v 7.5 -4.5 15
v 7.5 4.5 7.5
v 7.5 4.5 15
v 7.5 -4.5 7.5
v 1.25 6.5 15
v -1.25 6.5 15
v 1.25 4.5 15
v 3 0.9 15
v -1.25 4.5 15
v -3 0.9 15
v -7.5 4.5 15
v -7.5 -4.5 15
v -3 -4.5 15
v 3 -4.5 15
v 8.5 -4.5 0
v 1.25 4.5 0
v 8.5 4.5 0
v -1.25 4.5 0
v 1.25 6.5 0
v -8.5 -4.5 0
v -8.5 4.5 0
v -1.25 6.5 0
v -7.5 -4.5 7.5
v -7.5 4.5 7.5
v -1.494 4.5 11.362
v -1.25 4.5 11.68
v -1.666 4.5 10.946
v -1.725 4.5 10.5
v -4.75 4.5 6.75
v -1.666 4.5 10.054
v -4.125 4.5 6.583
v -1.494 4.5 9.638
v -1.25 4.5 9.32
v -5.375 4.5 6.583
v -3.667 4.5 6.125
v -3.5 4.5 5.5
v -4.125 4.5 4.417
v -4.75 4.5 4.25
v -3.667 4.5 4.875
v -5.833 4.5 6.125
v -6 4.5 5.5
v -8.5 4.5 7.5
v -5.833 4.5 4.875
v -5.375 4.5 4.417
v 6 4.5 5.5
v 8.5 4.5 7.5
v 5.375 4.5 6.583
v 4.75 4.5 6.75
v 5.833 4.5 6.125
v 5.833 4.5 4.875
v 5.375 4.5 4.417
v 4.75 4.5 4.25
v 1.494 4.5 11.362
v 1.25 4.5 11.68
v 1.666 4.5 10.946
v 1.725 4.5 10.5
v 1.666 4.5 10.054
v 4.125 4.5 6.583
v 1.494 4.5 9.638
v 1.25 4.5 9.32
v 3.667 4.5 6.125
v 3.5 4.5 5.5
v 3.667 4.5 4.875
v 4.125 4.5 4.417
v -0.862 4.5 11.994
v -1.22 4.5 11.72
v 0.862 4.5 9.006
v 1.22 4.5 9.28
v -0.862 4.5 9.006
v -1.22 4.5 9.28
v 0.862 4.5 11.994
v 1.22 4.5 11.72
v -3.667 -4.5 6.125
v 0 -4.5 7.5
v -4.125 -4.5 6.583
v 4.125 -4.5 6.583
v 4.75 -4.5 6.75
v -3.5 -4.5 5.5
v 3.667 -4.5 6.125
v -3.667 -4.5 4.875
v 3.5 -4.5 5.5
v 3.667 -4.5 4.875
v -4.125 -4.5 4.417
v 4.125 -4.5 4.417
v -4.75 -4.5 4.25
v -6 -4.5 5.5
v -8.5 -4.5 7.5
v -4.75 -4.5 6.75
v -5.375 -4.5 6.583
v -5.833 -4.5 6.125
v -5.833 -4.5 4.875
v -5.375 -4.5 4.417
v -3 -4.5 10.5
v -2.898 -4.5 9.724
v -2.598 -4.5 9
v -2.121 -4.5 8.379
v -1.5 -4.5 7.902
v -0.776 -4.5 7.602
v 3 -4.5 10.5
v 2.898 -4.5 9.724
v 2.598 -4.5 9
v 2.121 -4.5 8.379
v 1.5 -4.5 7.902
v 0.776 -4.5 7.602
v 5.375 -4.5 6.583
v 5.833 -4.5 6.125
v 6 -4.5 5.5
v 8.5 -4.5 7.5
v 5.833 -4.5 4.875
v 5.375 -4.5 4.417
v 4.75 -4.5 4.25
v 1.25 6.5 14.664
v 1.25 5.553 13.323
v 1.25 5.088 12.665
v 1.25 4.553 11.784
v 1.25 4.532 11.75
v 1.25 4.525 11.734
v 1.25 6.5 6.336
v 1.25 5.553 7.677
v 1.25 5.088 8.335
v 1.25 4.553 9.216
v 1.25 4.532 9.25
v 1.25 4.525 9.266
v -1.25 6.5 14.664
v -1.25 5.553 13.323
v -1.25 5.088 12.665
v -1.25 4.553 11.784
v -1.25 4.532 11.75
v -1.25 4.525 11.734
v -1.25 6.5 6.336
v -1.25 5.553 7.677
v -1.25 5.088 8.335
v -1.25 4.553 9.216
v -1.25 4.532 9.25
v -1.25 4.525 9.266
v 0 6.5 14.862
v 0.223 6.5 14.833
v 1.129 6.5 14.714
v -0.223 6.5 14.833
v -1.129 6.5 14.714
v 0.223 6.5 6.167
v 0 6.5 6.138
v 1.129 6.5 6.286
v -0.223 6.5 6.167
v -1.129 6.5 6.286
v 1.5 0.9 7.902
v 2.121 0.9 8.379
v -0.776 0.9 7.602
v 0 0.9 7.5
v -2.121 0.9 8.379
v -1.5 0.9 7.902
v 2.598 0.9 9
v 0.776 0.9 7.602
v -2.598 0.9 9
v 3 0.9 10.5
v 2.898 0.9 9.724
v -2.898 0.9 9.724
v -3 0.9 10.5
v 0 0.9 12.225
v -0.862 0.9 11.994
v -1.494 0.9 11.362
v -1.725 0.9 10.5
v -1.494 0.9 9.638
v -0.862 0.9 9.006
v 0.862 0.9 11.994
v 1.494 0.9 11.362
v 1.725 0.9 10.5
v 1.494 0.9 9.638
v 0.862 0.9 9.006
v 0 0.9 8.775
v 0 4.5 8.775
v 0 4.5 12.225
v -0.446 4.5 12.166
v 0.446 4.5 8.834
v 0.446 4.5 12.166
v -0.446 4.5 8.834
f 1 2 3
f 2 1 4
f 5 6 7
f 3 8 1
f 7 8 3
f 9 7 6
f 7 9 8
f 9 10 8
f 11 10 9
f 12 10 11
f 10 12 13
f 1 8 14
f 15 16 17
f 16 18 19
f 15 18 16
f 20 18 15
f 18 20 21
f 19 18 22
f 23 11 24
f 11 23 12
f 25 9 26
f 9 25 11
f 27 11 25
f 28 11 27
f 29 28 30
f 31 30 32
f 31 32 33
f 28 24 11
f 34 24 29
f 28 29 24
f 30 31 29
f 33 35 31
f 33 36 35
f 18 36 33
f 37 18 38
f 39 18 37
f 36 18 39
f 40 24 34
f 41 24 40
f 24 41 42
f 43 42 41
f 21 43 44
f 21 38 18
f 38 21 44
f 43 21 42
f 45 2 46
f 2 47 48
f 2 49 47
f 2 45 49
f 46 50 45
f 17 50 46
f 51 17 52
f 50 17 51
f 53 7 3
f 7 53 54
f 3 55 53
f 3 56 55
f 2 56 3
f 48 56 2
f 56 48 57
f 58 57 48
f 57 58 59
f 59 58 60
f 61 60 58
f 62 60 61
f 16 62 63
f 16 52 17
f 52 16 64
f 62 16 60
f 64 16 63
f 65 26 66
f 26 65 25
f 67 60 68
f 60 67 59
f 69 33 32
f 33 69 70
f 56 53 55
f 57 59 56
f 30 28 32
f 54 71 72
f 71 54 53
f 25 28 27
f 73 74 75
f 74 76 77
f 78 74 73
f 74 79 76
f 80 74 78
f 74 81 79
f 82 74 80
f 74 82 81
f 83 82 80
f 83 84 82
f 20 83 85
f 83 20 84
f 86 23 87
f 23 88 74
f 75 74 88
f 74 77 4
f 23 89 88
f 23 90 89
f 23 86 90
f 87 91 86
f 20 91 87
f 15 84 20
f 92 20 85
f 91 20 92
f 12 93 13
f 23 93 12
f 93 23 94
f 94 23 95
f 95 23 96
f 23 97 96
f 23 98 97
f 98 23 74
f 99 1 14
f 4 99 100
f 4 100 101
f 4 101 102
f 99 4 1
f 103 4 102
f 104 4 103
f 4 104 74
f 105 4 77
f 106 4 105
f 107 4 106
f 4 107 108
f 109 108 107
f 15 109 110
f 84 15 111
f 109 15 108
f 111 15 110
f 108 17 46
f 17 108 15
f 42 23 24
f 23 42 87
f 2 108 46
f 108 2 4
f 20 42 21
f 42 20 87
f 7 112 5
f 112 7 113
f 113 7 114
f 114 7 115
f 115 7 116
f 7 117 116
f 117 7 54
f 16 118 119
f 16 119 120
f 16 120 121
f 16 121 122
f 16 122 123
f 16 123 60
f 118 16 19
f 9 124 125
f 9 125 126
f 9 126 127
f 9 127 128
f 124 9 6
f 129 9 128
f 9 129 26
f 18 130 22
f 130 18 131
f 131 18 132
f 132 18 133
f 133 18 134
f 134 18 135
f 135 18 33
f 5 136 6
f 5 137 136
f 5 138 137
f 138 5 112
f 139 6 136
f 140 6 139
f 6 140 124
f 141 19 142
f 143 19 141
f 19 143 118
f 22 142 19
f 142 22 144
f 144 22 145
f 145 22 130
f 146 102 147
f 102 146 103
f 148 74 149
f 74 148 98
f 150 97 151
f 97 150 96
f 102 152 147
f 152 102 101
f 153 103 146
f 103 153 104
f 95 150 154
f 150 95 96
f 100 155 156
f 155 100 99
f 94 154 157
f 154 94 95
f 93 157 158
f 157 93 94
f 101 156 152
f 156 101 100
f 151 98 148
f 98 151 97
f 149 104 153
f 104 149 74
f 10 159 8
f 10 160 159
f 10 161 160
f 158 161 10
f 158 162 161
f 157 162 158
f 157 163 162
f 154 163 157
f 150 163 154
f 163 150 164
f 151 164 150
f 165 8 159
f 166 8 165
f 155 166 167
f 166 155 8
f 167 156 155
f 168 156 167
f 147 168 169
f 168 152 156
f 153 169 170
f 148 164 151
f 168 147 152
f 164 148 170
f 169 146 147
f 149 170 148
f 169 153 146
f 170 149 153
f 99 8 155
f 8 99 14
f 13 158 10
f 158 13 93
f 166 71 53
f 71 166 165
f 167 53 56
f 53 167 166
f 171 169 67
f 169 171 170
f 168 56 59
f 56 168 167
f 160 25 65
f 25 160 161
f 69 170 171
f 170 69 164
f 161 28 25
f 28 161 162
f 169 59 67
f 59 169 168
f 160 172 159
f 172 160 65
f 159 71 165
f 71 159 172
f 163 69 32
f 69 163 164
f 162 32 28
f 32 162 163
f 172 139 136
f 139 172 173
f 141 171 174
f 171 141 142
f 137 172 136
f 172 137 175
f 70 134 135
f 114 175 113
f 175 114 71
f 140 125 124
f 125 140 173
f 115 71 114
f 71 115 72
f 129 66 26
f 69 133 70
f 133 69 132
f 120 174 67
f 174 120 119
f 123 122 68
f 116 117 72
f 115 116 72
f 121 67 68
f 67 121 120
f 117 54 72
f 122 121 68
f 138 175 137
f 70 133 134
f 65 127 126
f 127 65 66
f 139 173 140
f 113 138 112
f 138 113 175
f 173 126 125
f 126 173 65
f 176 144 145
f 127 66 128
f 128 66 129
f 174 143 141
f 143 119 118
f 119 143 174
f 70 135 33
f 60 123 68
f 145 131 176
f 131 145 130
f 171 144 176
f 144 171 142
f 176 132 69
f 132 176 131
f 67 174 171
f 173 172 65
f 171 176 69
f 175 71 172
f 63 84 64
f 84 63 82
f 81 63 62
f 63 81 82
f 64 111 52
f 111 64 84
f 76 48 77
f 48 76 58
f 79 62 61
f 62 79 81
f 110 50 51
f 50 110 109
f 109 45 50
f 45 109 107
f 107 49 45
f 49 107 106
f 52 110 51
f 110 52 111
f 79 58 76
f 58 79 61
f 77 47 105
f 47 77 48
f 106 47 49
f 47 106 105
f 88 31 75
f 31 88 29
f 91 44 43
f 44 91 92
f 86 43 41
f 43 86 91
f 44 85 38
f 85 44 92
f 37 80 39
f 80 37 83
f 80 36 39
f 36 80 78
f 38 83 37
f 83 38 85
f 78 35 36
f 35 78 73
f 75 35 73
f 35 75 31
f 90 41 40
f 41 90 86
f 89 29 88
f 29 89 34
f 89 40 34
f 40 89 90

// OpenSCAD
// file: microswitch.scad
/**
 * @author Johann Rocholl <johann@rocholl.net>
 * @license GPL-3.0
 */

// Don't print this file, purchase real micro switches
// e.g. Honeywell ZM10B10A01 or OMRON SS-5 or similar.

module microswitch() {
  difference() {
    union() {
      translate([0, 0, 2.5])
        cube([19.8, 6, 10], center=true);
      translate([2.5, 0.5, 6])
        cube([2, 3.5, 5], center=true);
      for (x = [-8, -1, 8]) {
        translate([x, 0, 0])
          cube([0.6, 3.2, 13], center=true);
      }
    }
    for (x = [-9.5/2, 9.5/2]) {
      translate([x, 0, 0]) rotate([90, 0, 0])
        cylinder(r=2.5/2, h=20, center=true, $fn=12);
    }
  }
}

microswitch();
// file: configuration.scad
/**
 * @author Johann Rocholl <johann@rocholl.net>
 * @license GPL-3.0
 */

// Increase this if your slicer or printer make holes too tight.
extra_radius = 0.1;

// OD = outside diameter, corner to corner.
m3_nut_od = 6.1;
m3_nut_radius = m3_nut_od/2 + 0.2 + extra_radius;
m3_washer_radius = 3.5 + extra_radius;

// Major diameter of metric 3mm thread.
m3_major = 2.85;
m3_radius = m3_major/2 + extra_radius;
m3_wide_radius = m3_major/2 + extra_radius + 0.2;

// NEMA17 stepper motors.
motor_shaft_diameter = 5;
motor_shaft_radius = motor_shaft_diameter/2 + extra_radius;

// Frame brackets. M3x8mm screws work best with 3.6 mm brackets.
thickness = 3.6;

// OpenBeam or Misumi. Currently only 15x15 mm, but there is a plan
// to make models more parametric and allow 20x20 mm in the future.
extrusion = 15;

// Placement for the NEMA17 stepper motors.
motor_offset = 44;
motor_length = 47;
// main file
/**
 * @author Johann Rocholl <johann@rocholl.net>
 * @license GPL-3.0
 */

include <configuration.scad>;

use <microswitch.scad>;

thickness = 9;  // 1mm thicker than linear rail.
width = 15;  // Same as vertical extrusion.
height = 15;

module endstop() {
  difference() {
    union() {
      cube([width, thickness, height], center=true);
      translate([0, 0, -height/4])
        cube([width+2, thickness, height/2], center=true);
      translate([0, 2, 0])
        cube([2.5, thickness, height], center=true);
    }
    translate([0, 0, 3]) rotate([90, 0, 0]) {
      cylinder(r=m3_wide_radius, h=20, center=true, $fn=12);
      translate([0, 0, 3.6-thickness/2]) {
        cylinder(r=3, h=10, $fn=24);
        translate([0, 5, 5])
          cube([6, 10, 10], center=true);
      }
      translate([0, 0, -thickness/2]) scale([1, 1, -1])
        cylinder(r1=m3_wide_radius, r2=7, h=4, $fn=24);
    }
    translate([0, -3-thickness/2, -2]) rotate([0, 180, 0]) {
      % microswitch();
      for (x = [-9.5/2, 9.5/2]) {
        translate([x, 0, 0]) rotate([90, 0, 0])
          cylinder(r=2.5/2, h=40, center=true, $fn=12);
      }
    }
  }
}

translate([0, 0, height/2]) endstop();
